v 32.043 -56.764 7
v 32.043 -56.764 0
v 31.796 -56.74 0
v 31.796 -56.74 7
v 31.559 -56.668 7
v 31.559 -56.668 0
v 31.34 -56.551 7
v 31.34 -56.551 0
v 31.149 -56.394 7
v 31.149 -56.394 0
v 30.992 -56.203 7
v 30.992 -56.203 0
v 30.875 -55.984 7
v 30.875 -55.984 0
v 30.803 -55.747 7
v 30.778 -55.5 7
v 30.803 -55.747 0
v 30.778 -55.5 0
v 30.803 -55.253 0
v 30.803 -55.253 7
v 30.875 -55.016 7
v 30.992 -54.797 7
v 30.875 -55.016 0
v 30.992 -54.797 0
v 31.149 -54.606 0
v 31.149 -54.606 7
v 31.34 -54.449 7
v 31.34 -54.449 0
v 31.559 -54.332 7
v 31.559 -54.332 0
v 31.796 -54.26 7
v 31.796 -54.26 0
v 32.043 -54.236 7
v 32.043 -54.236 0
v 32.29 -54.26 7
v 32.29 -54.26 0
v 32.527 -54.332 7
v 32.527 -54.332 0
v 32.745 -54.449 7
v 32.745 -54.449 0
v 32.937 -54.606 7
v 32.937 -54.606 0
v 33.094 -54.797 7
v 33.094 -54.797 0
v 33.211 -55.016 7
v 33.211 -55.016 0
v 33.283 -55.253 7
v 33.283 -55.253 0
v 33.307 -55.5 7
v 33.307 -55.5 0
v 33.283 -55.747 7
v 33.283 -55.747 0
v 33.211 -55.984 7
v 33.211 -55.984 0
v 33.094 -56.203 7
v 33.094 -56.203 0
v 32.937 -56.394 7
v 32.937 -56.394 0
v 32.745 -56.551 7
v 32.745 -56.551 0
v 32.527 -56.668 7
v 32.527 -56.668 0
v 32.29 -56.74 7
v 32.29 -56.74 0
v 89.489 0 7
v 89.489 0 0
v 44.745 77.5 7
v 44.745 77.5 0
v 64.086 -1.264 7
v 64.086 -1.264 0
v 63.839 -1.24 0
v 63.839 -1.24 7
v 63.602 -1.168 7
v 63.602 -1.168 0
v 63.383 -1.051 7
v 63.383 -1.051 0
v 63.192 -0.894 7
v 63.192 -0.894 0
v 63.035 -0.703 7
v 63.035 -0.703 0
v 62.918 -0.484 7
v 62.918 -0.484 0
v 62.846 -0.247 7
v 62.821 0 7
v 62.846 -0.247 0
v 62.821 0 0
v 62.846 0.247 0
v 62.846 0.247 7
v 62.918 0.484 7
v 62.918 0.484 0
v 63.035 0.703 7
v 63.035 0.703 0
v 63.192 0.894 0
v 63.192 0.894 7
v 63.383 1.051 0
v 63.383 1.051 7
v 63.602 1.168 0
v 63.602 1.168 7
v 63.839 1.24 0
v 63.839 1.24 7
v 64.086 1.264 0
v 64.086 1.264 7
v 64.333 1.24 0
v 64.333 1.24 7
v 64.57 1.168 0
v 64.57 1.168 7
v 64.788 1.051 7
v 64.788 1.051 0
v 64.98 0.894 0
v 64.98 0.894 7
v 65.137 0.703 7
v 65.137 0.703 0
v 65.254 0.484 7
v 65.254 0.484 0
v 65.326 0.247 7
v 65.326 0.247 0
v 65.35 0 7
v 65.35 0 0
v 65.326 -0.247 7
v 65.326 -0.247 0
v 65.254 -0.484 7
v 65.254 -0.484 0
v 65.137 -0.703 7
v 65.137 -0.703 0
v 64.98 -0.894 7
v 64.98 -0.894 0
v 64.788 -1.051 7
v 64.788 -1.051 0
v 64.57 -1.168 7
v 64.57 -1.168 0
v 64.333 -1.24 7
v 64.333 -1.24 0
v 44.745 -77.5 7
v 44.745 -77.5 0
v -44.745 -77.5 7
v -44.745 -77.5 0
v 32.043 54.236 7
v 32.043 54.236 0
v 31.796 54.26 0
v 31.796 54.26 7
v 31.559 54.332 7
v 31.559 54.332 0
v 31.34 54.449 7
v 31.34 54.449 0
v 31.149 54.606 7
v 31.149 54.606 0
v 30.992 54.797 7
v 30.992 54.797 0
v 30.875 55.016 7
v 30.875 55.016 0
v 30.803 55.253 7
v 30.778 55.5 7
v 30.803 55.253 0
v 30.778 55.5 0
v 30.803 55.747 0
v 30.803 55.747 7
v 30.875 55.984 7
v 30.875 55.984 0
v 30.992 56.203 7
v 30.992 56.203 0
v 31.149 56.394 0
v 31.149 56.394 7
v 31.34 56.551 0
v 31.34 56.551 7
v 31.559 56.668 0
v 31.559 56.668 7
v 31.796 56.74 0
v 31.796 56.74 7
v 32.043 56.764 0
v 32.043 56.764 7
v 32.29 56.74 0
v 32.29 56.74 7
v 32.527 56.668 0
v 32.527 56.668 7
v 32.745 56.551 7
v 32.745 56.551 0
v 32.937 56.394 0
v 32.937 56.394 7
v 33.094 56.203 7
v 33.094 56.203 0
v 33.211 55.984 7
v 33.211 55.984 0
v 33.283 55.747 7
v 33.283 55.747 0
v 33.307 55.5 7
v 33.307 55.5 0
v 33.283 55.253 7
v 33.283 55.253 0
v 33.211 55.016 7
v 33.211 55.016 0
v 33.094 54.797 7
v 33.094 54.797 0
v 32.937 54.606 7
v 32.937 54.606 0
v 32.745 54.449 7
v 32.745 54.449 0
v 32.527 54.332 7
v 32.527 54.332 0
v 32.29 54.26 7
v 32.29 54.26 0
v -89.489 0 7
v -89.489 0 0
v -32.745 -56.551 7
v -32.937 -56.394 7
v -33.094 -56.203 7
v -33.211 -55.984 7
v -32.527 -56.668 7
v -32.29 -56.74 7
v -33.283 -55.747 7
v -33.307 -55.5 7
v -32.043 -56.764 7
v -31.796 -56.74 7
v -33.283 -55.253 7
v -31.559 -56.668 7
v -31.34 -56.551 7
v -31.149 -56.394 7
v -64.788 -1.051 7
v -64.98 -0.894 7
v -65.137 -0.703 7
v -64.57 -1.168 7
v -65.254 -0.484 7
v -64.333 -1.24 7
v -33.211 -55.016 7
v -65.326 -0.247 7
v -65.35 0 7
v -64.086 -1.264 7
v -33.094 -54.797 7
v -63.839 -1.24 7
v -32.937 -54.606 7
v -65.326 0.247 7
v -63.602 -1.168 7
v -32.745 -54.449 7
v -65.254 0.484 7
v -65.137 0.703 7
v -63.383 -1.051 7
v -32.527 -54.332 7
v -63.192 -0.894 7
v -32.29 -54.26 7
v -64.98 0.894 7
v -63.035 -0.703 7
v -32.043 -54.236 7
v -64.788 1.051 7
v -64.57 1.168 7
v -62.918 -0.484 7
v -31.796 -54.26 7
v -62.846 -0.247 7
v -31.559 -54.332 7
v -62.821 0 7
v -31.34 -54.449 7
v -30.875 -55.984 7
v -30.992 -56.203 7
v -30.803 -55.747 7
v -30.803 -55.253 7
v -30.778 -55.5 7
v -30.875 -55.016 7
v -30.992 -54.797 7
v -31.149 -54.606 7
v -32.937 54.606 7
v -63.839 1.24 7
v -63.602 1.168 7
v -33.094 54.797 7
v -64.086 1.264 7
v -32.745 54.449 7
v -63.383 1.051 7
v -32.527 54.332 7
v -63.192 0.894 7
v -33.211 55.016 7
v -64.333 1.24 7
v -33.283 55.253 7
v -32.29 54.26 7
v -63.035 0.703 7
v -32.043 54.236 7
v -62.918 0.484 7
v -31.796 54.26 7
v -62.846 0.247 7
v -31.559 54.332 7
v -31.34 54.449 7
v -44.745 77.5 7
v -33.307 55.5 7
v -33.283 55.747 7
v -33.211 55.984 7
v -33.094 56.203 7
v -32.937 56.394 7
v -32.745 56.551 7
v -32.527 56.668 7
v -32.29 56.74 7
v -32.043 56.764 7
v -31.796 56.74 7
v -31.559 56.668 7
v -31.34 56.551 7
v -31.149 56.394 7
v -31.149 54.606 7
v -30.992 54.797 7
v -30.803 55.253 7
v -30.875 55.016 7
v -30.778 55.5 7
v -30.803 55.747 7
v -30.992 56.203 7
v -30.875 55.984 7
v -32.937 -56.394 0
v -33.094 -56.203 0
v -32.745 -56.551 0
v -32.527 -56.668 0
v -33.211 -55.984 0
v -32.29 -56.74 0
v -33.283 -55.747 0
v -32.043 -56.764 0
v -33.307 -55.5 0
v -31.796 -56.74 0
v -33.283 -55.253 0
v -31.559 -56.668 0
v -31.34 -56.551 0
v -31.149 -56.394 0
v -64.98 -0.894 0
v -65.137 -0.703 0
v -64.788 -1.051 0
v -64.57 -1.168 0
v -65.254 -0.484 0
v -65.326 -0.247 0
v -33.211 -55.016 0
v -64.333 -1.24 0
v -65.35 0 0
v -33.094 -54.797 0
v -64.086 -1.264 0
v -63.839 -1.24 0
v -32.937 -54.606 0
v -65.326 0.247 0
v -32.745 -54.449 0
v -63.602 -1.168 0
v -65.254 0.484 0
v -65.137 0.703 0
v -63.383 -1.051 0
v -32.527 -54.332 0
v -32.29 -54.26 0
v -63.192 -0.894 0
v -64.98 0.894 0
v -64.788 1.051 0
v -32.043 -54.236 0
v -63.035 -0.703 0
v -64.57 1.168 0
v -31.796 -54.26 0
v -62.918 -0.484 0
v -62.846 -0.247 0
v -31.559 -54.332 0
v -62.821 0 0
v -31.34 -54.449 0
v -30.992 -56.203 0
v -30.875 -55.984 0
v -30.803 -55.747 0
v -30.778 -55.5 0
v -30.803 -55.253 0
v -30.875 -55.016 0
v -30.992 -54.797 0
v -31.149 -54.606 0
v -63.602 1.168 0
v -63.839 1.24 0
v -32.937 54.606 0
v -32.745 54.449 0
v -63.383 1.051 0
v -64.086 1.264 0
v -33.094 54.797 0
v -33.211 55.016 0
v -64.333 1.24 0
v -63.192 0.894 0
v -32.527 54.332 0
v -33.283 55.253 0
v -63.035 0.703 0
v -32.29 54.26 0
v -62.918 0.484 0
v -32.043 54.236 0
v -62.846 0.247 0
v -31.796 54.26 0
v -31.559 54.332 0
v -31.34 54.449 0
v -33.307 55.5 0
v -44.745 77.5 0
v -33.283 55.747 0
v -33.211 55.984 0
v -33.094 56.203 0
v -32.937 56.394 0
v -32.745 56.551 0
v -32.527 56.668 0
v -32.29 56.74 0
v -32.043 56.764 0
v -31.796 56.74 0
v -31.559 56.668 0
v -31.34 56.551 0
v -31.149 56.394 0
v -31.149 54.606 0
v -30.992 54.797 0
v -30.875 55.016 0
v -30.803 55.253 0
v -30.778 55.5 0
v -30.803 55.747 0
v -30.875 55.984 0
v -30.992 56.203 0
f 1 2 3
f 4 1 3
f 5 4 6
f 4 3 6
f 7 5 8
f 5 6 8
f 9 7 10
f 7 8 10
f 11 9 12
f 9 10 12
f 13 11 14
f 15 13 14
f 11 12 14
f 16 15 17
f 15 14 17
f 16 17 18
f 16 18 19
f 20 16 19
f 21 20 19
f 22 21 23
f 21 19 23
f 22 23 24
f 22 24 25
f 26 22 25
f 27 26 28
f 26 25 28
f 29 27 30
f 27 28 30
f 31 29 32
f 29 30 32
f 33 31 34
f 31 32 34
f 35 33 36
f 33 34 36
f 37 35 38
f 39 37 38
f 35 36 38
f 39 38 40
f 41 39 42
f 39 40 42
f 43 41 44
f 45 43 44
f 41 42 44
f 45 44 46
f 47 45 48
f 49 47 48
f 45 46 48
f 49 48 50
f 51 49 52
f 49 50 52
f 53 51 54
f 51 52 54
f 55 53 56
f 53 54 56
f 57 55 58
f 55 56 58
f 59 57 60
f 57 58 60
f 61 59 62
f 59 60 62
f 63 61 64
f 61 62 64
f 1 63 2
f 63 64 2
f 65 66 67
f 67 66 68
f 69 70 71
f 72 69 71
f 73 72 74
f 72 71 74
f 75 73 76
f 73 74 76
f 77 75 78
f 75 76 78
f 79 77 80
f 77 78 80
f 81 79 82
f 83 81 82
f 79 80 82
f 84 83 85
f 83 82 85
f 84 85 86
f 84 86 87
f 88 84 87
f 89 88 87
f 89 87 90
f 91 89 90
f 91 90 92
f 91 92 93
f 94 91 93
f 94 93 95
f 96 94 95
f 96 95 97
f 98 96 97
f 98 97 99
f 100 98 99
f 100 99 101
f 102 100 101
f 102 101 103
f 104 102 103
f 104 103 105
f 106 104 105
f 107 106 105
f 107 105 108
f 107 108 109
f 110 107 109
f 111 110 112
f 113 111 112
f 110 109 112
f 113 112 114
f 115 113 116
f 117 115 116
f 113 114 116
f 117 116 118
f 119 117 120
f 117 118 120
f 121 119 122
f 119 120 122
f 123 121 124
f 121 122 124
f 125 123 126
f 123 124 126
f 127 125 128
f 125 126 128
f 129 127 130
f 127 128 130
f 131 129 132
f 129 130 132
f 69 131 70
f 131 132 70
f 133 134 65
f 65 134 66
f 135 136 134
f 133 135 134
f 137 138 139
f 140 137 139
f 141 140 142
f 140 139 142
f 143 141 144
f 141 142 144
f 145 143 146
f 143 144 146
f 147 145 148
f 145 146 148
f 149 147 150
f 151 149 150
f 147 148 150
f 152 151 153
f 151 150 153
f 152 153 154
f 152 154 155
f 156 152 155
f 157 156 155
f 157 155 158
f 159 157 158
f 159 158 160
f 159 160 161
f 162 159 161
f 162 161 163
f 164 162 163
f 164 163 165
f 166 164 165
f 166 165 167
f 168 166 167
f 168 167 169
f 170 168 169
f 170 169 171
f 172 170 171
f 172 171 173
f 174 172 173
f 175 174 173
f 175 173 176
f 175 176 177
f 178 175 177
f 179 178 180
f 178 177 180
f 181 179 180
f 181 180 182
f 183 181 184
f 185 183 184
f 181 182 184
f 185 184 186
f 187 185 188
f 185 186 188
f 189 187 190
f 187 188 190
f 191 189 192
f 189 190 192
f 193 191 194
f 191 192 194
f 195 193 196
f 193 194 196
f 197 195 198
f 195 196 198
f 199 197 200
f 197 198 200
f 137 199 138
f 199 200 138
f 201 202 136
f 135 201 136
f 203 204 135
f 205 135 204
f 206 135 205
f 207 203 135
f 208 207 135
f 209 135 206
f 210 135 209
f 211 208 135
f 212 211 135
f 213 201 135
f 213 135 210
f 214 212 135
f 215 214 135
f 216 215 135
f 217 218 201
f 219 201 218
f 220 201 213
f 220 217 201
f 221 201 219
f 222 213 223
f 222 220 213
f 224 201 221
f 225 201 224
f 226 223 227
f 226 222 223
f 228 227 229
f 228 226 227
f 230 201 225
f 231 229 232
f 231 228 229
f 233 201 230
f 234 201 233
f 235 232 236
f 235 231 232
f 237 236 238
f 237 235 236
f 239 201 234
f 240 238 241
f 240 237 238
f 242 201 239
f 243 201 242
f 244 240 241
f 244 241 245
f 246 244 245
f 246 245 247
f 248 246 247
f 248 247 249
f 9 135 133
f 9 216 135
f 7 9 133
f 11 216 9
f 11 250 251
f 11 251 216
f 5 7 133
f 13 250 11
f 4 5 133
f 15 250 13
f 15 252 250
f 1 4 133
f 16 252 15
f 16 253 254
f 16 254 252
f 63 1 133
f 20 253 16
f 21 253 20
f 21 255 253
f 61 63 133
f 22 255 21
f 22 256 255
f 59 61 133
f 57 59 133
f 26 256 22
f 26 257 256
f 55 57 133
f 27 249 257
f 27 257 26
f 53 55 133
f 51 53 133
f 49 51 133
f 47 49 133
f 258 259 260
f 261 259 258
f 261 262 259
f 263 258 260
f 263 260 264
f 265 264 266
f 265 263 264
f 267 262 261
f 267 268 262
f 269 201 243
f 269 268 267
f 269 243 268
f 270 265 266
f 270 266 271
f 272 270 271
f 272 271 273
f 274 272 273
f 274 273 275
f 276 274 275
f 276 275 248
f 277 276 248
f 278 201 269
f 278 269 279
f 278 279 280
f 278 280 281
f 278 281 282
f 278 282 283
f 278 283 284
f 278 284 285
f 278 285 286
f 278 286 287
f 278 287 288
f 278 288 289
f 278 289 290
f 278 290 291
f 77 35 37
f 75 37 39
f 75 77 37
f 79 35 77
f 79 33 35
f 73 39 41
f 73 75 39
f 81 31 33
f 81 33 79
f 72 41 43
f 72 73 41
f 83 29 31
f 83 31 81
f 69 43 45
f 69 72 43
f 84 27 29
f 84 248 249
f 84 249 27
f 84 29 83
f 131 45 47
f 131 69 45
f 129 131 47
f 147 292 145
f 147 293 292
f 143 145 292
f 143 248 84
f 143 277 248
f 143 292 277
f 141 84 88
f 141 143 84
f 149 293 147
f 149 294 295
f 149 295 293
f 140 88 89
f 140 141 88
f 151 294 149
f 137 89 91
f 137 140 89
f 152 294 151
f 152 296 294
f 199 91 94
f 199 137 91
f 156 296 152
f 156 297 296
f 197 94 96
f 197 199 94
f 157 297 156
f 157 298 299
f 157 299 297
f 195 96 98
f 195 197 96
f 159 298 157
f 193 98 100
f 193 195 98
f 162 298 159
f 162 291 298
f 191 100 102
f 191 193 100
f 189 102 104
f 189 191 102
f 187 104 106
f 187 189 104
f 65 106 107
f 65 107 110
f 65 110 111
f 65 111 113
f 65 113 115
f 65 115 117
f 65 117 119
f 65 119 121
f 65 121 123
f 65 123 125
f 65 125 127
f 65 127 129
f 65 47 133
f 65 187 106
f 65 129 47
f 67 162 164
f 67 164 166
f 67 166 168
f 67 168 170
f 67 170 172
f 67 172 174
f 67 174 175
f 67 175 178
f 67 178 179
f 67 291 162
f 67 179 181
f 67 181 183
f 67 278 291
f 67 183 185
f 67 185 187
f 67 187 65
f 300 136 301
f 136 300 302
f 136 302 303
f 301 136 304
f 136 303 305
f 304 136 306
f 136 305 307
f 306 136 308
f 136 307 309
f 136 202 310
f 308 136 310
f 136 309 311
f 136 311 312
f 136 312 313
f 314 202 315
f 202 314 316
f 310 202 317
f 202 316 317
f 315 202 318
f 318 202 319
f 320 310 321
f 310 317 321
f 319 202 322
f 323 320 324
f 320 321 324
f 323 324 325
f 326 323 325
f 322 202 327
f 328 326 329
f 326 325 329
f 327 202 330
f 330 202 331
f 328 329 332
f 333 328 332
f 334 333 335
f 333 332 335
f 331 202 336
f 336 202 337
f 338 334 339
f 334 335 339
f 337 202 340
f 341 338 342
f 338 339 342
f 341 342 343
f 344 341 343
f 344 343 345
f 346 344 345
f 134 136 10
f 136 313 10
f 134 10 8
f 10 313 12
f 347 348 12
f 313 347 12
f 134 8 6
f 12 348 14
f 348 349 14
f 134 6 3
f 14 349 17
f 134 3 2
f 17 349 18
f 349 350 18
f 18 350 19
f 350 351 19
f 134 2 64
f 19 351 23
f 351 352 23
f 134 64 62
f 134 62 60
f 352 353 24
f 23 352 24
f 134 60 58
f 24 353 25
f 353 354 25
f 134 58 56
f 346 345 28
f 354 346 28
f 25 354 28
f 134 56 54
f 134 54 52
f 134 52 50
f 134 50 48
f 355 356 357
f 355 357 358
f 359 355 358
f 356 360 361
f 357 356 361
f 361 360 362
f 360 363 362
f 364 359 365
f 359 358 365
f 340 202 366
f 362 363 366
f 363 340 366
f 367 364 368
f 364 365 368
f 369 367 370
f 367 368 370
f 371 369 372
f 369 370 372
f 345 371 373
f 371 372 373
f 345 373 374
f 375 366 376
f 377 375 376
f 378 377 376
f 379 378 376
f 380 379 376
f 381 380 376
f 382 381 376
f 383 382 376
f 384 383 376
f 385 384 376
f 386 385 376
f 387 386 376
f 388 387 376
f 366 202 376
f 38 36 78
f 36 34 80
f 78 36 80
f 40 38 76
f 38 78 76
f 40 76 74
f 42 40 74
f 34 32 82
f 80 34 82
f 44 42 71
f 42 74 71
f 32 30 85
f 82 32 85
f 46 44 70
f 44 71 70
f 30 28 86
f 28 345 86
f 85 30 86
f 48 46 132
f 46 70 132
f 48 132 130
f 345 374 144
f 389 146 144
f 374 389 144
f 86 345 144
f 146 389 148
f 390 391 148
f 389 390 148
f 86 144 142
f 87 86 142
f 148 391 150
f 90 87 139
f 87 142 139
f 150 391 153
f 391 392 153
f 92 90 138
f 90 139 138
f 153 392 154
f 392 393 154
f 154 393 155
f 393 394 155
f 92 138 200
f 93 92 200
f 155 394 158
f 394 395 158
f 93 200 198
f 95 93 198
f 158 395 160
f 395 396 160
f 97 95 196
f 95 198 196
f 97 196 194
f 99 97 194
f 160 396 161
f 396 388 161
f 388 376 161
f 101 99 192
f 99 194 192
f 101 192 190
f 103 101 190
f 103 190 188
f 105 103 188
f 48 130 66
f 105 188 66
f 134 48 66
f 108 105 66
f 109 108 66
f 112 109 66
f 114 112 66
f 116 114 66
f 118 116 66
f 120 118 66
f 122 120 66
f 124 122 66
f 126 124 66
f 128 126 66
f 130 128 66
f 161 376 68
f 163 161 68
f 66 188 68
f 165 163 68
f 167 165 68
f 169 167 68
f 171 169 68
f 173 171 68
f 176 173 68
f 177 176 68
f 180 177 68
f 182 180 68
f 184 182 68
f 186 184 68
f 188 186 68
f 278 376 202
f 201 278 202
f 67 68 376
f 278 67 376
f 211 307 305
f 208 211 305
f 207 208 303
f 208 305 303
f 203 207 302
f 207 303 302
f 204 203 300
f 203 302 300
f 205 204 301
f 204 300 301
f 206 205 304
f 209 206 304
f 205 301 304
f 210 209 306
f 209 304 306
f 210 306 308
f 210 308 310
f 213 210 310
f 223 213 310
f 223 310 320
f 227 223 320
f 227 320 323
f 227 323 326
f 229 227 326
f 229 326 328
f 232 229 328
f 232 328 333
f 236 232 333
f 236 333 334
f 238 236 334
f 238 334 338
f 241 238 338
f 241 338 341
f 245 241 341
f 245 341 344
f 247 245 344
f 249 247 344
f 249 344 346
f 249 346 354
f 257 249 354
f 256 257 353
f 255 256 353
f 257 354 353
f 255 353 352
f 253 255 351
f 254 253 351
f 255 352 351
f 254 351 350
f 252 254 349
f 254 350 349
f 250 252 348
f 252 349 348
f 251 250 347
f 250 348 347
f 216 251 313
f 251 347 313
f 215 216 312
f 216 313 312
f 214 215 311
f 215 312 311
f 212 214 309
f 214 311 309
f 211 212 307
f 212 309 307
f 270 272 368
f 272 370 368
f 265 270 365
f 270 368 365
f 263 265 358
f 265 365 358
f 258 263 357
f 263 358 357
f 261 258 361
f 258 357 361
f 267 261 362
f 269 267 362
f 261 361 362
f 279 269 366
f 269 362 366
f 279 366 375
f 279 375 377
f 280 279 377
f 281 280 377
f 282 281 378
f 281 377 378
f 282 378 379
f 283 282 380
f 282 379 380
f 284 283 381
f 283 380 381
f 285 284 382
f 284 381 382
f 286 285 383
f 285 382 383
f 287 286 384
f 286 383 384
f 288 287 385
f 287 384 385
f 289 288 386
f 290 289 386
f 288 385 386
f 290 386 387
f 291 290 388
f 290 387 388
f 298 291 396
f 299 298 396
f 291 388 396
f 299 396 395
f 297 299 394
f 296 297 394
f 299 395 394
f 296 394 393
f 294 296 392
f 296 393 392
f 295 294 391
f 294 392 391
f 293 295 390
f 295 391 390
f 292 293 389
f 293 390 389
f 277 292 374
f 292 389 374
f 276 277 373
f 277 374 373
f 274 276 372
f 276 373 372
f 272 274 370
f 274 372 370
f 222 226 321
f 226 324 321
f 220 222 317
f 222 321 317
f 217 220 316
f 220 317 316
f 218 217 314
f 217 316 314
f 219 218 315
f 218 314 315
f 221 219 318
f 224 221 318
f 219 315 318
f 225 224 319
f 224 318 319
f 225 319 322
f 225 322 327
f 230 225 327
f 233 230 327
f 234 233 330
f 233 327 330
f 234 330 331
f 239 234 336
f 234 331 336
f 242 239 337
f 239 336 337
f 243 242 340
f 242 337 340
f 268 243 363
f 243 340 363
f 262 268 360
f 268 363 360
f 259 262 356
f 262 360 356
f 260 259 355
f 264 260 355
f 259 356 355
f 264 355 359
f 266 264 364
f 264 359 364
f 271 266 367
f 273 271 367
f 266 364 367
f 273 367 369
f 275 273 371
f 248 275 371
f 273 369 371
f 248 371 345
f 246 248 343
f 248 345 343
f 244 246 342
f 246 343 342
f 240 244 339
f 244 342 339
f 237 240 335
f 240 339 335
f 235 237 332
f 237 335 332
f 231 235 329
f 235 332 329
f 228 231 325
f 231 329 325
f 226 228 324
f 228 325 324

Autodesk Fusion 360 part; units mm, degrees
sketch "Sketch1" plane through (0, 0, 0) normal (0, 0, 1) x (1, 0, 0)
  line L0 (44.7446, 77.5) -> (-44.7446, 77.5)
  line L1 (-44.7446, 77.5) -> (-89.4893, 0)
  line L2 (-89.4893, 0) -> (-44.7446, -77.5)
  line L3 (-44.7446, -77.5) -> (44.7446, -77.5)
  line L4 (44.7446, -77.5) -> (89.4893, 0)
  line L5 (89.4893, 0) -> (44.7446, 77.5)
  dimension "d1" = 77.5
extrude "Extrude1" add sketch "Sketch1" along normal blind 7
sketch "Sketch2" plane through (0, 0, 7) normal (0, 0, 1) x (-1, 0, 0)
  line L0 (-89.4893, 0) -> (-44.7446, -77.5)
  line L1 (-44.7446, -77.5) -> (44.7446, -77.5)
  line L2 (44.7446, -77.5) -> (89.4893, 0)
  line L3 (89.4893, 0) -> (44.7446, 77.5)
  line L4 (44.7446, 77.5) -> (-44.7446, 77.5)
  line L5 (-44.7446, 77.5) -> (-89.4893, 0)
  line L6 (-32.0429, -77.5) -> (-32.0429, -55.5) construction
  line L7 (-51.0955, -66.5) -> (-32.0429, -55.5) construction
  line L8 (51.0955, -66.5) -> (32.0429, -55.5) construction
  line L9 (32.0429, -77.5) -> (32.0429, -55.5) construction
  line L10 (-83.1384, -11) -> (-64.0859, 0) construction
  line L11 (-83.1384, 11) -> (-64.0859, 0) construction
  line L12 (-32.0429, -77.5) -> (-32.0429, -55.5) construction
  line L13 (-51.0955, -66.5) -> (-32.0429, -55.5) construction
  line L14 (83.1384, 11) -> (64.0859, 0) construction
  line L15 (83.1384, -11) -> (64.0859, 0) construction
  line L16 (32.0429, 77.5) -> (32.0429, 55.5) construction
  line L17 (51.0955, 66.5) -> (32.0429, 55.5) construction
  line L18 (83.1384, 11) -> (64.0859, 0) construction
  line L19 (83.1384, -11) -> (64.0859, 0) construction
  line L20 (-51.0955, 66.5) -> (-32.0429, 55.5) construction
  line L21 (-32.0429, 77.5) -> (-32.0429, 55.5) construction
  circle A0 centre (-32.0429, 55.5) radius 1.5
  circle A1 centre (-64.0859, 0) radius 1.5
  circle A2 centre (-32.0429, -55.5) radius 1.5
  circle A3 centre (32.0429, -55.5) radius 1.5
  circle A4 centre (64.0859, 0) radius 1.5
  circle A5 centre (32.0429, 55.5) radius 1.5
  dimension "d4" = 22
  dimension "d5" = 22
  dimension "d6" = 22
  dimension "d7" = 22
  dimension "d8" = 22
  dimension "d9" = 22
  dimension "d10" = 22
  dimension "d11" = 22
  dimension "d12" = 22
  dimension "d13" = 22
  dimension "d14" = 22
  dimension "d15" = 22
  dimension "d16" = 22
  dimension "d17" = 22
  dimension "d18" = 22
  dimension "d19" = 22
  dimension "d20" = 3
  dimension "d21" = 3
  dimension "d22" = 3
  dimension "d23" = 3
  dimension "d24" = 3
  dimension "d25" = 3
hole "Hole1" at (32.0429, 55.5, 7) at (64.0859, 0, 7) at (32.0429, -55.5, 7) at (-32.0429, -55.5, 7) at (-32.0429, 55.5, 7) at (-64.0859, 0, 7) direction (0, 0, -1) diameter 2.529 end through all
